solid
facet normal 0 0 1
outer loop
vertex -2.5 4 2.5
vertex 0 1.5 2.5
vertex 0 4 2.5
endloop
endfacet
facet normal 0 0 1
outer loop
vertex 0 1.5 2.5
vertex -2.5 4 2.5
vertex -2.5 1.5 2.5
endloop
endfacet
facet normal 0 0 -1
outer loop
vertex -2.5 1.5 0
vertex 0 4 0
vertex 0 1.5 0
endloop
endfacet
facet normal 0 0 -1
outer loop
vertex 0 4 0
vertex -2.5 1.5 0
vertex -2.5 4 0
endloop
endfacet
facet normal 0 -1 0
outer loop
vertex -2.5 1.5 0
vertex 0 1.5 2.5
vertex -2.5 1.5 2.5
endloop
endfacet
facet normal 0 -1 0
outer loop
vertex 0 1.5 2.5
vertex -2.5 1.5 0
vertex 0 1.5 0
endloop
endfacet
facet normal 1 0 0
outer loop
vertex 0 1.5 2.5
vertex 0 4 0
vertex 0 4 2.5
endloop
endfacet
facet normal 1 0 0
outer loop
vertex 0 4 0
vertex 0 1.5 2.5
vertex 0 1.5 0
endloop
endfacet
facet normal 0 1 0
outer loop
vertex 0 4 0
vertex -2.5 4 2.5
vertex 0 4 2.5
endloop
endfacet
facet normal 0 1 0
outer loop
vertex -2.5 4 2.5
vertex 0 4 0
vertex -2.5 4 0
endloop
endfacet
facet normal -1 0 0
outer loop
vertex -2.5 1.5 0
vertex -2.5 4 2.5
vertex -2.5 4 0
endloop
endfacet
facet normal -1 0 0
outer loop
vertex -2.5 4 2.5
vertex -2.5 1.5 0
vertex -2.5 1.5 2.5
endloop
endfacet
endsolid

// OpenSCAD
union() {
  translate([-2.5, 1.5, 0.0]) cube(size=[2.5,2.5,2.5], center=false);
}
